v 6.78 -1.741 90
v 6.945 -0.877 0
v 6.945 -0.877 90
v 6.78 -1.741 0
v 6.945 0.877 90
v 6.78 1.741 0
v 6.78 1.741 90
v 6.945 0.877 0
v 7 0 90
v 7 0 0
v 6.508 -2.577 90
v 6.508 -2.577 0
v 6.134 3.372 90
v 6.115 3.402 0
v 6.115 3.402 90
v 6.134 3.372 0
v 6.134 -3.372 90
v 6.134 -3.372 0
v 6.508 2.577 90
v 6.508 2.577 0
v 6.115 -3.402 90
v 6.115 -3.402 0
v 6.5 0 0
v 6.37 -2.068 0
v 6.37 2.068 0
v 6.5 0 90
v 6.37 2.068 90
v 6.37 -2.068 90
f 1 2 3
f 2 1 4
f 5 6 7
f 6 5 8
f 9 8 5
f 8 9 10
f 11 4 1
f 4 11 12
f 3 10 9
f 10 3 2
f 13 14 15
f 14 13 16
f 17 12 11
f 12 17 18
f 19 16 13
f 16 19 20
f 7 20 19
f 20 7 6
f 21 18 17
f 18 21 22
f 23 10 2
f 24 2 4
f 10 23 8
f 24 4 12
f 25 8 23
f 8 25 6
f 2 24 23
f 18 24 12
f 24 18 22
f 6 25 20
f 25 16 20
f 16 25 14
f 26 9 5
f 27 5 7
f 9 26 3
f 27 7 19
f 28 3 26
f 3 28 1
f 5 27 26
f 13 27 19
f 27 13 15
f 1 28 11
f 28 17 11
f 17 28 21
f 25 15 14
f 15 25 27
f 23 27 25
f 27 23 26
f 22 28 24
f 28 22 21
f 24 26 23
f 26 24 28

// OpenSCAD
$fn = 50;


difference() {
	union() {
		cylinder(h = 90, r = 7.0000000000);
		translate(v = [-13.0000000000, 0, 0]) {
			cylinder(h = 90, r = 7.0000000000);
		}
	}
	union() {
		cylinder(h = 90, r = 3.2500000000);
		cylinder(h = 90, r = 1.8000000000);
		cylinder(h = 90, r = 1.8000000000);
		cylinder(h = 90, r = 1.8000000000);
		translate(v = [-17.5000000000, 0, 0]) {
			hull() {
				translate(v = [-3.7500000000, 0.0000000000, 0]) {
					cylinder(h = 90, r = 7.5000000000);
				}
				translate(v = [3.7500000000, 0.0000000000, 0]) {
					cylinder(h = 90, r = 7.5000000000);
				}
				translate(v = [-3.7500000000, -0.0000000000, 0]) {
					cylinder(h = 90, r = 7.5000000000);
				}
				translate(v = [3.7500000000, -0.0000000000, 0]) {
					cylinder(h = 90, r = 7.5000000000);
				}
			}
		}
		translate(v = [-10.0000000000, 0, 0.0000000000]) {
			cylinder(h = 90, r = 16.5000000000);
		}
	}
}
